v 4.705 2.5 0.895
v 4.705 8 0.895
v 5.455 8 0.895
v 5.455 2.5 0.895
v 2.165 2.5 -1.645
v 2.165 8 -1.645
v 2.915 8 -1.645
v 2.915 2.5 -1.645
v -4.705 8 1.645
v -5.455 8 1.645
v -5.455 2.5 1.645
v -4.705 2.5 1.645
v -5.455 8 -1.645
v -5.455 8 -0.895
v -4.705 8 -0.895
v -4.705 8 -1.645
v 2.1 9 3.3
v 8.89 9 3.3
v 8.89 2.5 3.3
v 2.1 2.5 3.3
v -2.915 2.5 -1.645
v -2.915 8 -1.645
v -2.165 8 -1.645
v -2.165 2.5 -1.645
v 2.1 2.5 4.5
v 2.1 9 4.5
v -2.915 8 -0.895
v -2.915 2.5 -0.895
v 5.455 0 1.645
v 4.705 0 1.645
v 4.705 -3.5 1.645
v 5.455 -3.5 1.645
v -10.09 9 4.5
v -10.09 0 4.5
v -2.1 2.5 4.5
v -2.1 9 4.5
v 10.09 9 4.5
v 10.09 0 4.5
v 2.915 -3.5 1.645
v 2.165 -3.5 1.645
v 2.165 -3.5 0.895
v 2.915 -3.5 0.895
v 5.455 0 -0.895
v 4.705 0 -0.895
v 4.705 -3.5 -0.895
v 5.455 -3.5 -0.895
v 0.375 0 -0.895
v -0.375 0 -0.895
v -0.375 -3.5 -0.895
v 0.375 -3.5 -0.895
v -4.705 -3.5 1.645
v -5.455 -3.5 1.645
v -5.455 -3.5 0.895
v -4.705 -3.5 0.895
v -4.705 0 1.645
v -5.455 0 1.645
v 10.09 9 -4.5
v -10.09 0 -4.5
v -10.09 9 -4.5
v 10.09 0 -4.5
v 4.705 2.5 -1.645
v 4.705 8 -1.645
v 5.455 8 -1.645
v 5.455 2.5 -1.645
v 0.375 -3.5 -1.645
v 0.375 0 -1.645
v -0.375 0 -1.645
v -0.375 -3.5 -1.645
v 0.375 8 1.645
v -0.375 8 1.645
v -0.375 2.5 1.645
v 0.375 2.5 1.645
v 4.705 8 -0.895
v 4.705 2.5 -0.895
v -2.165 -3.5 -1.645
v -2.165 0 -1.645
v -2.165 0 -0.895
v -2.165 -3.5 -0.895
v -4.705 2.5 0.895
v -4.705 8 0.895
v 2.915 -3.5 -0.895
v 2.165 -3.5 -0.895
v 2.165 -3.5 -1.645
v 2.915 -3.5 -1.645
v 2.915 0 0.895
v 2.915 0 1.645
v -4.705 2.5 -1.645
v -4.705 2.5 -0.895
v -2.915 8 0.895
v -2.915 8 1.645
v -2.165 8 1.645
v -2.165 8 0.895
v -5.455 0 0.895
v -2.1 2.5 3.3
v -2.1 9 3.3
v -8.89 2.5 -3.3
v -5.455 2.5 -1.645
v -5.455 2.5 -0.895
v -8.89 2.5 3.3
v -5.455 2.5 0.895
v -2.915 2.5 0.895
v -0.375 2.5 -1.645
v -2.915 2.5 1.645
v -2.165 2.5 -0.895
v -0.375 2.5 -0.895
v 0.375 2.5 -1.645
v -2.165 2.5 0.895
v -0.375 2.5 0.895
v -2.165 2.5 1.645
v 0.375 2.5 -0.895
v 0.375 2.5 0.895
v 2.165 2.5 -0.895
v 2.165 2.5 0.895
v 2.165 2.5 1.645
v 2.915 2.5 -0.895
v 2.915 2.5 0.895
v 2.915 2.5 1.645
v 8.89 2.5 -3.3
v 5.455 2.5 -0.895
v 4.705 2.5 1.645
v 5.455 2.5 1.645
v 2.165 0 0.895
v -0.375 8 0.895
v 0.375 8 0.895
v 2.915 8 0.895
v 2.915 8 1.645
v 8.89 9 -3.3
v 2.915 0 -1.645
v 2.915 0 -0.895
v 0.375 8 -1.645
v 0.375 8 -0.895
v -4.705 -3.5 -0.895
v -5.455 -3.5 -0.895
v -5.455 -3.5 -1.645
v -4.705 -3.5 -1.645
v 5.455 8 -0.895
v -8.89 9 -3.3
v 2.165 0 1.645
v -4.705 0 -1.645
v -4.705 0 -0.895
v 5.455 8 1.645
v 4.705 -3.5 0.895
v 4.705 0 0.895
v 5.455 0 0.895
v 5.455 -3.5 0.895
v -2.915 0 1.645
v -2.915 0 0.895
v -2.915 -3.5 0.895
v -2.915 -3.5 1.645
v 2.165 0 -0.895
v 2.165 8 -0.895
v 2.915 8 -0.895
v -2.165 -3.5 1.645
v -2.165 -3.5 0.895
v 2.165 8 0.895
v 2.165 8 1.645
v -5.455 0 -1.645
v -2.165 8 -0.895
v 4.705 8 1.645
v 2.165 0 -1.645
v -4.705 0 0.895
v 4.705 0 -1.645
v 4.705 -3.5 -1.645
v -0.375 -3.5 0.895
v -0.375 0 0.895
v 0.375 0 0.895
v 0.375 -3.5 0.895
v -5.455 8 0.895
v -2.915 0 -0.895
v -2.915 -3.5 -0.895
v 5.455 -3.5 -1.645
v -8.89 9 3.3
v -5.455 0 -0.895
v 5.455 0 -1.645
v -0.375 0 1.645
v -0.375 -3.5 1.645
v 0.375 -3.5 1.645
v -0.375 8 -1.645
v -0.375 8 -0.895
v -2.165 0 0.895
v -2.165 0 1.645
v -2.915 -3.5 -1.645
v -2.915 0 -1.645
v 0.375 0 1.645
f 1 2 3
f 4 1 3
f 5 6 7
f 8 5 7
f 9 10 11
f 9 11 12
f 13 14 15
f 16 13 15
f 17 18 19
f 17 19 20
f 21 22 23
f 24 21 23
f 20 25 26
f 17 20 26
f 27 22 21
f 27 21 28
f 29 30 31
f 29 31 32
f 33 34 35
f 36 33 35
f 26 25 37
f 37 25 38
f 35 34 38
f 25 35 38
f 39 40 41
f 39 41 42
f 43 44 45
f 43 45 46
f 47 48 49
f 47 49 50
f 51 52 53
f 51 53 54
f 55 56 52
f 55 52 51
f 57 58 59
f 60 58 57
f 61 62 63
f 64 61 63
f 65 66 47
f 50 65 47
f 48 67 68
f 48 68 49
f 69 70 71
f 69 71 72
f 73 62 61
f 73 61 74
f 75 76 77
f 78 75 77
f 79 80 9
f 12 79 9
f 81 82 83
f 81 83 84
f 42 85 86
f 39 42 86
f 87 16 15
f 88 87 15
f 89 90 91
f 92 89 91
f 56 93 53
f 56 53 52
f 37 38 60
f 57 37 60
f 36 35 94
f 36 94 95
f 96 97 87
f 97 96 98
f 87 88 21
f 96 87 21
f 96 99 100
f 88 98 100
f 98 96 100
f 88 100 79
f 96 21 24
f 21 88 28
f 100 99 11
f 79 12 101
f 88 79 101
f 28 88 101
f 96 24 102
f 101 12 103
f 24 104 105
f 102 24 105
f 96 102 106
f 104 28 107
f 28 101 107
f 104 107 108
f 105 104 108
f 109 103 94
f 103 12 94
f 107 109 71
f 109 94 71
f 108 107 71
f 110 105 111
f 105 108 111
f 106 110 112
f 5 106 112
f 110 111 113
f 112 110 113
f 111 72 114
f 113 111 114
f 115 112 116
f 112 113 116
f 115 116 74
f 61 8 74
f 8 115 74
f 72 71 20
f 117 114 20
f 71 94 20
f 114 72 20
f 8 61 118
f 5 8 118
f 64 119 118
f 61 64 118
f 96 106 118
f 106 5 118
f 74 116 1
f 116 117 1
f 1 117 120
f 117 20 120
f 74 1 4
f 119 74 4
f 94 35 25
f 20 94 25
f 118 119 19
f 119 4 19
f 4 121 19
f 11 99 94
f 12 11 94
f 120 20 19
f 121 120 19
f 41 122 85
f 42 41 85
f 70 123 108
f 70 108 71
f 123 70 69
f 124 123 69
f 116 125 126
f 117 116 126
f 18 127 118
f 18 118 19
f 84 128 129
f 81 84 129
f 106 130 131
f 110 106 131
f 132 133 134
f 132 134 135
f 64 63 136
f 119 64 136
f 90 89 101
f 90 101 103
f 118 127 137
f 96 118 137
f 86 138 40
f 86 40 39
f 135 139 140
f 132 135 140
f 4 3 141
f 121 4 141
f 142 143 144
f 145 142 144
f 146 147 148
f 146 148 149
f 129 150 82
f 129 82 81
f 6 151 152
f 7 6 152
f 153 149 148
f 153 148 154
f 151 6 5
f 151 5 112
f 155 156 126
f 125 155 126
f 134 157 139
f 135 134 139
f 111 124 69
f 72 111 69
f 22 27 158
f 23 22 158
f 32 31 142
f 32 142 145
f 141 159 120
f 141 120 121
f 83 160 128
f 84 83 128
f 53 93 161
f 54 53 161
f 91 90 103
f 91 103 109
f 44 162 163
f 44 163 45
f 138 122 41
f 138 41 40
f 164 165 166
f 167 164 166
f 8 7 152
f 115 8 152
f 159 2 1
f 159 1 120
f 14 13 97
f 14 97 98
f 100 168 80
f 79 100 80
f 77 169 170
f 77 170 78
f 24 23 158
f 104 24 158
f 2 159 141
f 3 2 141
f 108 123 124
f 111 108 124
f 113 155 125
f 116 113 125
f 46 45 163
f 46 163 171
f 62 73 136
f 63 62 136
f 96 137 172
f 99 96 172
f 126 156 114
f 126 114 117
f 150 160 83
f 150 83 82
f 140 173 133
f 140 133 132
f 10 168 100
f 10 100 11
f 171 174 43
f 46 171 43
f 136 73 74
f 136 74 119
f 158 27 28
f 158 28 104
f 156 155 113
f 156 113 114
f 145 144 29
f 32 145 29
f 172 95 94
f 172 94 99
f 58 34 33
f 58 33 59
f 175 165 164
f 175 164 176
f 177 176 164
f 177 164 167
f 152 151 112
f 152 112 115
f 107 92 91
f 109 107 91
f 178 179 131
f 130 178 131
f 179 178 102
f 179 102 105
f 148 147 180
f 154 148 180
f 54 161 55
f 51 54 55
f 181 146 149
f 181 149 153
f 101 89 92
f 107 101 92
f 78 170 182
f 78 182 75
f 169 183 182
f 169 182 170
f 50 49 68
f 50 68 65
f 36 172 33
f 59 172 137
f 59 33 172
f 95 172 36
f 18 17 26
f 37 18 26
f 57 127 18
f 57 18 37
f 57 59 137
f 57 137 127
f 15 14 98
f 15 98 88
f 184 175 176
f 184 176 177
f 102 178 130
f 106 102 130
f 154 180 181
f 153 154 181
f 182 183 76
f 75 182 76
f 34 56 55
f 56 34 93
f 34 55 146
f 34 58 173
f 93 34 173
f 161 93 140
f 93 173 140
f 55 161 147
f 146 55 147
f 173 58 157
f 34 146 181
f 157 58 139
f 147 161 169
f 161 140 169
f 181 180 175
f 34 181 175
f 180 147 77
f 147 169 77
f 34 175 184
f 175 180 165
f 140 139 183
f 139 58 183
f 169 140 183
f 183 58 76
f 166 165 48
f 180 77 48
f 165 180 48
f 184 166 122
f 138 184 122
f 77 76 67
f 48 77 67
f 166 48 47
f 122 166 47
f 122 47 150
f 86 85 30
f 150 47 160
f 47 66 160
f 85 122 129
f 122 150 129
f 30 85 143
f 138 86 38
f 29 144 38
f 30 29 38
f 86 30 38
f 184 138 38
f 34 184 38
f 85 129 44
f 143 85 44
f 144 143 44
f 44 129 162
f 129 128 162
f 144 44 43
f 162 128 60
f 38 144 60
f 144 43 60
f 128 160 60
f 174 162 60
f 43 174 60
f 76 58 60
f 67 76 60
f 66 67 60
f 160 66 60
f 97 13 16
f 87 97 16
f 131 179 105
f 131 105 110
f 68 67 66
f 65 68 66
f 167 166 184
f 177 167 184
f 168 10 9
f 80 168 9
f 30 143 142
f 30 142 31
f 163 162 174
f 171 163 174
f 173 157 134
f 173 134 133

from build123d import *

# Parameters (mm, degrees)
SKETCH_1_W           = 20.18
SKETCH_1_H           = 9
EXTRUDE_1_DEPTH      = 9
SKETCH_2_W           = 17.78
SKETCH_2_H           = 6.6
CUT_EXTRUDE_1_DEPTH  = 6.5
SKETCH_3_W           = 4.2
SKETCH_3_H           = 6.5
CUT_EXTRUDE_2_DEPTH  = 6.5
EXTRUDE_2_DEPTH      = 3.5
EXTRUDE_2_DEPTH_BACK = 8
SKETCH_5_W           = 0.75
SKETCH_5_H           = 0.75


with BuildPart() as part:
    # 草图1 → 拉伸1 (new body)
    with BuildSketch(Plane(origin=(0, 0, 0), x_dir=(1, 0, 0), z_dir=(0, 1, 0))):
        Rectangle(SKETCH_1_W, SKETCH_1_H)
    extrude(amount=EXTRUDE_1_DEPTH)

    # 草图2 → 切除-拉伸1 (cut)
    with BuildSketch(Plane(origin=(0, 9, 0), x_dir=(-1, 0, 0), z_dir=(0, 1, 0))):
        Rectangle(SKETCH_2_W, SKETCH_2_H)
    extrude(amount=-CUT_EXTRUDE_1_DEPTH, mode=Mode.SUBTRACT)

    # 草图3 → 切除-拉伸2 (cut)
    with BuildSketch(Plane.XY.offset(4.5)):
        with Locations((0, 5.75)):
            Rectangle(SKETCH_3_W, SKETCH_3_H)
    extrude(amount=-CUT_EXTRUDE_2_DEPTH, mode=Mode.SUBTRACT)

    # 草图5 → 拉伸2 (add, two sides: drawn at the far end of the back side and taken through both)
    with BuildSketch(Plane.XZ.offset(-EXTRUDE_2_DEPTH_BACK)):
        with Locations((0, 1.27)):
            Rectangle(SKETCH_5_W, SKETCH_5_H)
        with Locations((2.54, 1.27)):
            Rectangle(SKETCH_5_W, SKETCH_5_H)
        with Locations((5.08, 1.27)):
            Rectangle(SKETCH_5_W, SKETCH_5_H)
        with Locations((-2.54, 1.27)):
            Rectangle(SKETCH_5_W, SKETCH_5_H)
        with Locations((-5.08, 1.27)):
            Rectangle(SKETCH_5_W, SKETCH_5_H)
        with Locations((-5.08, -1.27)):
            Rectangle(SKETCH_5_W, SKETCH_5_H)
        with Locations((-2.54, -1.27)):
            Rectangle(SKETCH_5_W, SKETCH_5_H)
        with Locations((5.08, -1.27)):
            Rectangle(SKETCH_5_W, SKETCH_5_H)
        with Locations((2.54, -1.27)):
            Rectangle(SKETCH_5_W, SKETCH_5_H)
        with Locations((0, -1.27)):
            Rectangle(SKETCH_5_W, SKETCH_5_H)
    extrude(amount=EXTRUDE_2_DEPTH + EXTRUDE_2_DEPTH_BACK)


solid = part.part
